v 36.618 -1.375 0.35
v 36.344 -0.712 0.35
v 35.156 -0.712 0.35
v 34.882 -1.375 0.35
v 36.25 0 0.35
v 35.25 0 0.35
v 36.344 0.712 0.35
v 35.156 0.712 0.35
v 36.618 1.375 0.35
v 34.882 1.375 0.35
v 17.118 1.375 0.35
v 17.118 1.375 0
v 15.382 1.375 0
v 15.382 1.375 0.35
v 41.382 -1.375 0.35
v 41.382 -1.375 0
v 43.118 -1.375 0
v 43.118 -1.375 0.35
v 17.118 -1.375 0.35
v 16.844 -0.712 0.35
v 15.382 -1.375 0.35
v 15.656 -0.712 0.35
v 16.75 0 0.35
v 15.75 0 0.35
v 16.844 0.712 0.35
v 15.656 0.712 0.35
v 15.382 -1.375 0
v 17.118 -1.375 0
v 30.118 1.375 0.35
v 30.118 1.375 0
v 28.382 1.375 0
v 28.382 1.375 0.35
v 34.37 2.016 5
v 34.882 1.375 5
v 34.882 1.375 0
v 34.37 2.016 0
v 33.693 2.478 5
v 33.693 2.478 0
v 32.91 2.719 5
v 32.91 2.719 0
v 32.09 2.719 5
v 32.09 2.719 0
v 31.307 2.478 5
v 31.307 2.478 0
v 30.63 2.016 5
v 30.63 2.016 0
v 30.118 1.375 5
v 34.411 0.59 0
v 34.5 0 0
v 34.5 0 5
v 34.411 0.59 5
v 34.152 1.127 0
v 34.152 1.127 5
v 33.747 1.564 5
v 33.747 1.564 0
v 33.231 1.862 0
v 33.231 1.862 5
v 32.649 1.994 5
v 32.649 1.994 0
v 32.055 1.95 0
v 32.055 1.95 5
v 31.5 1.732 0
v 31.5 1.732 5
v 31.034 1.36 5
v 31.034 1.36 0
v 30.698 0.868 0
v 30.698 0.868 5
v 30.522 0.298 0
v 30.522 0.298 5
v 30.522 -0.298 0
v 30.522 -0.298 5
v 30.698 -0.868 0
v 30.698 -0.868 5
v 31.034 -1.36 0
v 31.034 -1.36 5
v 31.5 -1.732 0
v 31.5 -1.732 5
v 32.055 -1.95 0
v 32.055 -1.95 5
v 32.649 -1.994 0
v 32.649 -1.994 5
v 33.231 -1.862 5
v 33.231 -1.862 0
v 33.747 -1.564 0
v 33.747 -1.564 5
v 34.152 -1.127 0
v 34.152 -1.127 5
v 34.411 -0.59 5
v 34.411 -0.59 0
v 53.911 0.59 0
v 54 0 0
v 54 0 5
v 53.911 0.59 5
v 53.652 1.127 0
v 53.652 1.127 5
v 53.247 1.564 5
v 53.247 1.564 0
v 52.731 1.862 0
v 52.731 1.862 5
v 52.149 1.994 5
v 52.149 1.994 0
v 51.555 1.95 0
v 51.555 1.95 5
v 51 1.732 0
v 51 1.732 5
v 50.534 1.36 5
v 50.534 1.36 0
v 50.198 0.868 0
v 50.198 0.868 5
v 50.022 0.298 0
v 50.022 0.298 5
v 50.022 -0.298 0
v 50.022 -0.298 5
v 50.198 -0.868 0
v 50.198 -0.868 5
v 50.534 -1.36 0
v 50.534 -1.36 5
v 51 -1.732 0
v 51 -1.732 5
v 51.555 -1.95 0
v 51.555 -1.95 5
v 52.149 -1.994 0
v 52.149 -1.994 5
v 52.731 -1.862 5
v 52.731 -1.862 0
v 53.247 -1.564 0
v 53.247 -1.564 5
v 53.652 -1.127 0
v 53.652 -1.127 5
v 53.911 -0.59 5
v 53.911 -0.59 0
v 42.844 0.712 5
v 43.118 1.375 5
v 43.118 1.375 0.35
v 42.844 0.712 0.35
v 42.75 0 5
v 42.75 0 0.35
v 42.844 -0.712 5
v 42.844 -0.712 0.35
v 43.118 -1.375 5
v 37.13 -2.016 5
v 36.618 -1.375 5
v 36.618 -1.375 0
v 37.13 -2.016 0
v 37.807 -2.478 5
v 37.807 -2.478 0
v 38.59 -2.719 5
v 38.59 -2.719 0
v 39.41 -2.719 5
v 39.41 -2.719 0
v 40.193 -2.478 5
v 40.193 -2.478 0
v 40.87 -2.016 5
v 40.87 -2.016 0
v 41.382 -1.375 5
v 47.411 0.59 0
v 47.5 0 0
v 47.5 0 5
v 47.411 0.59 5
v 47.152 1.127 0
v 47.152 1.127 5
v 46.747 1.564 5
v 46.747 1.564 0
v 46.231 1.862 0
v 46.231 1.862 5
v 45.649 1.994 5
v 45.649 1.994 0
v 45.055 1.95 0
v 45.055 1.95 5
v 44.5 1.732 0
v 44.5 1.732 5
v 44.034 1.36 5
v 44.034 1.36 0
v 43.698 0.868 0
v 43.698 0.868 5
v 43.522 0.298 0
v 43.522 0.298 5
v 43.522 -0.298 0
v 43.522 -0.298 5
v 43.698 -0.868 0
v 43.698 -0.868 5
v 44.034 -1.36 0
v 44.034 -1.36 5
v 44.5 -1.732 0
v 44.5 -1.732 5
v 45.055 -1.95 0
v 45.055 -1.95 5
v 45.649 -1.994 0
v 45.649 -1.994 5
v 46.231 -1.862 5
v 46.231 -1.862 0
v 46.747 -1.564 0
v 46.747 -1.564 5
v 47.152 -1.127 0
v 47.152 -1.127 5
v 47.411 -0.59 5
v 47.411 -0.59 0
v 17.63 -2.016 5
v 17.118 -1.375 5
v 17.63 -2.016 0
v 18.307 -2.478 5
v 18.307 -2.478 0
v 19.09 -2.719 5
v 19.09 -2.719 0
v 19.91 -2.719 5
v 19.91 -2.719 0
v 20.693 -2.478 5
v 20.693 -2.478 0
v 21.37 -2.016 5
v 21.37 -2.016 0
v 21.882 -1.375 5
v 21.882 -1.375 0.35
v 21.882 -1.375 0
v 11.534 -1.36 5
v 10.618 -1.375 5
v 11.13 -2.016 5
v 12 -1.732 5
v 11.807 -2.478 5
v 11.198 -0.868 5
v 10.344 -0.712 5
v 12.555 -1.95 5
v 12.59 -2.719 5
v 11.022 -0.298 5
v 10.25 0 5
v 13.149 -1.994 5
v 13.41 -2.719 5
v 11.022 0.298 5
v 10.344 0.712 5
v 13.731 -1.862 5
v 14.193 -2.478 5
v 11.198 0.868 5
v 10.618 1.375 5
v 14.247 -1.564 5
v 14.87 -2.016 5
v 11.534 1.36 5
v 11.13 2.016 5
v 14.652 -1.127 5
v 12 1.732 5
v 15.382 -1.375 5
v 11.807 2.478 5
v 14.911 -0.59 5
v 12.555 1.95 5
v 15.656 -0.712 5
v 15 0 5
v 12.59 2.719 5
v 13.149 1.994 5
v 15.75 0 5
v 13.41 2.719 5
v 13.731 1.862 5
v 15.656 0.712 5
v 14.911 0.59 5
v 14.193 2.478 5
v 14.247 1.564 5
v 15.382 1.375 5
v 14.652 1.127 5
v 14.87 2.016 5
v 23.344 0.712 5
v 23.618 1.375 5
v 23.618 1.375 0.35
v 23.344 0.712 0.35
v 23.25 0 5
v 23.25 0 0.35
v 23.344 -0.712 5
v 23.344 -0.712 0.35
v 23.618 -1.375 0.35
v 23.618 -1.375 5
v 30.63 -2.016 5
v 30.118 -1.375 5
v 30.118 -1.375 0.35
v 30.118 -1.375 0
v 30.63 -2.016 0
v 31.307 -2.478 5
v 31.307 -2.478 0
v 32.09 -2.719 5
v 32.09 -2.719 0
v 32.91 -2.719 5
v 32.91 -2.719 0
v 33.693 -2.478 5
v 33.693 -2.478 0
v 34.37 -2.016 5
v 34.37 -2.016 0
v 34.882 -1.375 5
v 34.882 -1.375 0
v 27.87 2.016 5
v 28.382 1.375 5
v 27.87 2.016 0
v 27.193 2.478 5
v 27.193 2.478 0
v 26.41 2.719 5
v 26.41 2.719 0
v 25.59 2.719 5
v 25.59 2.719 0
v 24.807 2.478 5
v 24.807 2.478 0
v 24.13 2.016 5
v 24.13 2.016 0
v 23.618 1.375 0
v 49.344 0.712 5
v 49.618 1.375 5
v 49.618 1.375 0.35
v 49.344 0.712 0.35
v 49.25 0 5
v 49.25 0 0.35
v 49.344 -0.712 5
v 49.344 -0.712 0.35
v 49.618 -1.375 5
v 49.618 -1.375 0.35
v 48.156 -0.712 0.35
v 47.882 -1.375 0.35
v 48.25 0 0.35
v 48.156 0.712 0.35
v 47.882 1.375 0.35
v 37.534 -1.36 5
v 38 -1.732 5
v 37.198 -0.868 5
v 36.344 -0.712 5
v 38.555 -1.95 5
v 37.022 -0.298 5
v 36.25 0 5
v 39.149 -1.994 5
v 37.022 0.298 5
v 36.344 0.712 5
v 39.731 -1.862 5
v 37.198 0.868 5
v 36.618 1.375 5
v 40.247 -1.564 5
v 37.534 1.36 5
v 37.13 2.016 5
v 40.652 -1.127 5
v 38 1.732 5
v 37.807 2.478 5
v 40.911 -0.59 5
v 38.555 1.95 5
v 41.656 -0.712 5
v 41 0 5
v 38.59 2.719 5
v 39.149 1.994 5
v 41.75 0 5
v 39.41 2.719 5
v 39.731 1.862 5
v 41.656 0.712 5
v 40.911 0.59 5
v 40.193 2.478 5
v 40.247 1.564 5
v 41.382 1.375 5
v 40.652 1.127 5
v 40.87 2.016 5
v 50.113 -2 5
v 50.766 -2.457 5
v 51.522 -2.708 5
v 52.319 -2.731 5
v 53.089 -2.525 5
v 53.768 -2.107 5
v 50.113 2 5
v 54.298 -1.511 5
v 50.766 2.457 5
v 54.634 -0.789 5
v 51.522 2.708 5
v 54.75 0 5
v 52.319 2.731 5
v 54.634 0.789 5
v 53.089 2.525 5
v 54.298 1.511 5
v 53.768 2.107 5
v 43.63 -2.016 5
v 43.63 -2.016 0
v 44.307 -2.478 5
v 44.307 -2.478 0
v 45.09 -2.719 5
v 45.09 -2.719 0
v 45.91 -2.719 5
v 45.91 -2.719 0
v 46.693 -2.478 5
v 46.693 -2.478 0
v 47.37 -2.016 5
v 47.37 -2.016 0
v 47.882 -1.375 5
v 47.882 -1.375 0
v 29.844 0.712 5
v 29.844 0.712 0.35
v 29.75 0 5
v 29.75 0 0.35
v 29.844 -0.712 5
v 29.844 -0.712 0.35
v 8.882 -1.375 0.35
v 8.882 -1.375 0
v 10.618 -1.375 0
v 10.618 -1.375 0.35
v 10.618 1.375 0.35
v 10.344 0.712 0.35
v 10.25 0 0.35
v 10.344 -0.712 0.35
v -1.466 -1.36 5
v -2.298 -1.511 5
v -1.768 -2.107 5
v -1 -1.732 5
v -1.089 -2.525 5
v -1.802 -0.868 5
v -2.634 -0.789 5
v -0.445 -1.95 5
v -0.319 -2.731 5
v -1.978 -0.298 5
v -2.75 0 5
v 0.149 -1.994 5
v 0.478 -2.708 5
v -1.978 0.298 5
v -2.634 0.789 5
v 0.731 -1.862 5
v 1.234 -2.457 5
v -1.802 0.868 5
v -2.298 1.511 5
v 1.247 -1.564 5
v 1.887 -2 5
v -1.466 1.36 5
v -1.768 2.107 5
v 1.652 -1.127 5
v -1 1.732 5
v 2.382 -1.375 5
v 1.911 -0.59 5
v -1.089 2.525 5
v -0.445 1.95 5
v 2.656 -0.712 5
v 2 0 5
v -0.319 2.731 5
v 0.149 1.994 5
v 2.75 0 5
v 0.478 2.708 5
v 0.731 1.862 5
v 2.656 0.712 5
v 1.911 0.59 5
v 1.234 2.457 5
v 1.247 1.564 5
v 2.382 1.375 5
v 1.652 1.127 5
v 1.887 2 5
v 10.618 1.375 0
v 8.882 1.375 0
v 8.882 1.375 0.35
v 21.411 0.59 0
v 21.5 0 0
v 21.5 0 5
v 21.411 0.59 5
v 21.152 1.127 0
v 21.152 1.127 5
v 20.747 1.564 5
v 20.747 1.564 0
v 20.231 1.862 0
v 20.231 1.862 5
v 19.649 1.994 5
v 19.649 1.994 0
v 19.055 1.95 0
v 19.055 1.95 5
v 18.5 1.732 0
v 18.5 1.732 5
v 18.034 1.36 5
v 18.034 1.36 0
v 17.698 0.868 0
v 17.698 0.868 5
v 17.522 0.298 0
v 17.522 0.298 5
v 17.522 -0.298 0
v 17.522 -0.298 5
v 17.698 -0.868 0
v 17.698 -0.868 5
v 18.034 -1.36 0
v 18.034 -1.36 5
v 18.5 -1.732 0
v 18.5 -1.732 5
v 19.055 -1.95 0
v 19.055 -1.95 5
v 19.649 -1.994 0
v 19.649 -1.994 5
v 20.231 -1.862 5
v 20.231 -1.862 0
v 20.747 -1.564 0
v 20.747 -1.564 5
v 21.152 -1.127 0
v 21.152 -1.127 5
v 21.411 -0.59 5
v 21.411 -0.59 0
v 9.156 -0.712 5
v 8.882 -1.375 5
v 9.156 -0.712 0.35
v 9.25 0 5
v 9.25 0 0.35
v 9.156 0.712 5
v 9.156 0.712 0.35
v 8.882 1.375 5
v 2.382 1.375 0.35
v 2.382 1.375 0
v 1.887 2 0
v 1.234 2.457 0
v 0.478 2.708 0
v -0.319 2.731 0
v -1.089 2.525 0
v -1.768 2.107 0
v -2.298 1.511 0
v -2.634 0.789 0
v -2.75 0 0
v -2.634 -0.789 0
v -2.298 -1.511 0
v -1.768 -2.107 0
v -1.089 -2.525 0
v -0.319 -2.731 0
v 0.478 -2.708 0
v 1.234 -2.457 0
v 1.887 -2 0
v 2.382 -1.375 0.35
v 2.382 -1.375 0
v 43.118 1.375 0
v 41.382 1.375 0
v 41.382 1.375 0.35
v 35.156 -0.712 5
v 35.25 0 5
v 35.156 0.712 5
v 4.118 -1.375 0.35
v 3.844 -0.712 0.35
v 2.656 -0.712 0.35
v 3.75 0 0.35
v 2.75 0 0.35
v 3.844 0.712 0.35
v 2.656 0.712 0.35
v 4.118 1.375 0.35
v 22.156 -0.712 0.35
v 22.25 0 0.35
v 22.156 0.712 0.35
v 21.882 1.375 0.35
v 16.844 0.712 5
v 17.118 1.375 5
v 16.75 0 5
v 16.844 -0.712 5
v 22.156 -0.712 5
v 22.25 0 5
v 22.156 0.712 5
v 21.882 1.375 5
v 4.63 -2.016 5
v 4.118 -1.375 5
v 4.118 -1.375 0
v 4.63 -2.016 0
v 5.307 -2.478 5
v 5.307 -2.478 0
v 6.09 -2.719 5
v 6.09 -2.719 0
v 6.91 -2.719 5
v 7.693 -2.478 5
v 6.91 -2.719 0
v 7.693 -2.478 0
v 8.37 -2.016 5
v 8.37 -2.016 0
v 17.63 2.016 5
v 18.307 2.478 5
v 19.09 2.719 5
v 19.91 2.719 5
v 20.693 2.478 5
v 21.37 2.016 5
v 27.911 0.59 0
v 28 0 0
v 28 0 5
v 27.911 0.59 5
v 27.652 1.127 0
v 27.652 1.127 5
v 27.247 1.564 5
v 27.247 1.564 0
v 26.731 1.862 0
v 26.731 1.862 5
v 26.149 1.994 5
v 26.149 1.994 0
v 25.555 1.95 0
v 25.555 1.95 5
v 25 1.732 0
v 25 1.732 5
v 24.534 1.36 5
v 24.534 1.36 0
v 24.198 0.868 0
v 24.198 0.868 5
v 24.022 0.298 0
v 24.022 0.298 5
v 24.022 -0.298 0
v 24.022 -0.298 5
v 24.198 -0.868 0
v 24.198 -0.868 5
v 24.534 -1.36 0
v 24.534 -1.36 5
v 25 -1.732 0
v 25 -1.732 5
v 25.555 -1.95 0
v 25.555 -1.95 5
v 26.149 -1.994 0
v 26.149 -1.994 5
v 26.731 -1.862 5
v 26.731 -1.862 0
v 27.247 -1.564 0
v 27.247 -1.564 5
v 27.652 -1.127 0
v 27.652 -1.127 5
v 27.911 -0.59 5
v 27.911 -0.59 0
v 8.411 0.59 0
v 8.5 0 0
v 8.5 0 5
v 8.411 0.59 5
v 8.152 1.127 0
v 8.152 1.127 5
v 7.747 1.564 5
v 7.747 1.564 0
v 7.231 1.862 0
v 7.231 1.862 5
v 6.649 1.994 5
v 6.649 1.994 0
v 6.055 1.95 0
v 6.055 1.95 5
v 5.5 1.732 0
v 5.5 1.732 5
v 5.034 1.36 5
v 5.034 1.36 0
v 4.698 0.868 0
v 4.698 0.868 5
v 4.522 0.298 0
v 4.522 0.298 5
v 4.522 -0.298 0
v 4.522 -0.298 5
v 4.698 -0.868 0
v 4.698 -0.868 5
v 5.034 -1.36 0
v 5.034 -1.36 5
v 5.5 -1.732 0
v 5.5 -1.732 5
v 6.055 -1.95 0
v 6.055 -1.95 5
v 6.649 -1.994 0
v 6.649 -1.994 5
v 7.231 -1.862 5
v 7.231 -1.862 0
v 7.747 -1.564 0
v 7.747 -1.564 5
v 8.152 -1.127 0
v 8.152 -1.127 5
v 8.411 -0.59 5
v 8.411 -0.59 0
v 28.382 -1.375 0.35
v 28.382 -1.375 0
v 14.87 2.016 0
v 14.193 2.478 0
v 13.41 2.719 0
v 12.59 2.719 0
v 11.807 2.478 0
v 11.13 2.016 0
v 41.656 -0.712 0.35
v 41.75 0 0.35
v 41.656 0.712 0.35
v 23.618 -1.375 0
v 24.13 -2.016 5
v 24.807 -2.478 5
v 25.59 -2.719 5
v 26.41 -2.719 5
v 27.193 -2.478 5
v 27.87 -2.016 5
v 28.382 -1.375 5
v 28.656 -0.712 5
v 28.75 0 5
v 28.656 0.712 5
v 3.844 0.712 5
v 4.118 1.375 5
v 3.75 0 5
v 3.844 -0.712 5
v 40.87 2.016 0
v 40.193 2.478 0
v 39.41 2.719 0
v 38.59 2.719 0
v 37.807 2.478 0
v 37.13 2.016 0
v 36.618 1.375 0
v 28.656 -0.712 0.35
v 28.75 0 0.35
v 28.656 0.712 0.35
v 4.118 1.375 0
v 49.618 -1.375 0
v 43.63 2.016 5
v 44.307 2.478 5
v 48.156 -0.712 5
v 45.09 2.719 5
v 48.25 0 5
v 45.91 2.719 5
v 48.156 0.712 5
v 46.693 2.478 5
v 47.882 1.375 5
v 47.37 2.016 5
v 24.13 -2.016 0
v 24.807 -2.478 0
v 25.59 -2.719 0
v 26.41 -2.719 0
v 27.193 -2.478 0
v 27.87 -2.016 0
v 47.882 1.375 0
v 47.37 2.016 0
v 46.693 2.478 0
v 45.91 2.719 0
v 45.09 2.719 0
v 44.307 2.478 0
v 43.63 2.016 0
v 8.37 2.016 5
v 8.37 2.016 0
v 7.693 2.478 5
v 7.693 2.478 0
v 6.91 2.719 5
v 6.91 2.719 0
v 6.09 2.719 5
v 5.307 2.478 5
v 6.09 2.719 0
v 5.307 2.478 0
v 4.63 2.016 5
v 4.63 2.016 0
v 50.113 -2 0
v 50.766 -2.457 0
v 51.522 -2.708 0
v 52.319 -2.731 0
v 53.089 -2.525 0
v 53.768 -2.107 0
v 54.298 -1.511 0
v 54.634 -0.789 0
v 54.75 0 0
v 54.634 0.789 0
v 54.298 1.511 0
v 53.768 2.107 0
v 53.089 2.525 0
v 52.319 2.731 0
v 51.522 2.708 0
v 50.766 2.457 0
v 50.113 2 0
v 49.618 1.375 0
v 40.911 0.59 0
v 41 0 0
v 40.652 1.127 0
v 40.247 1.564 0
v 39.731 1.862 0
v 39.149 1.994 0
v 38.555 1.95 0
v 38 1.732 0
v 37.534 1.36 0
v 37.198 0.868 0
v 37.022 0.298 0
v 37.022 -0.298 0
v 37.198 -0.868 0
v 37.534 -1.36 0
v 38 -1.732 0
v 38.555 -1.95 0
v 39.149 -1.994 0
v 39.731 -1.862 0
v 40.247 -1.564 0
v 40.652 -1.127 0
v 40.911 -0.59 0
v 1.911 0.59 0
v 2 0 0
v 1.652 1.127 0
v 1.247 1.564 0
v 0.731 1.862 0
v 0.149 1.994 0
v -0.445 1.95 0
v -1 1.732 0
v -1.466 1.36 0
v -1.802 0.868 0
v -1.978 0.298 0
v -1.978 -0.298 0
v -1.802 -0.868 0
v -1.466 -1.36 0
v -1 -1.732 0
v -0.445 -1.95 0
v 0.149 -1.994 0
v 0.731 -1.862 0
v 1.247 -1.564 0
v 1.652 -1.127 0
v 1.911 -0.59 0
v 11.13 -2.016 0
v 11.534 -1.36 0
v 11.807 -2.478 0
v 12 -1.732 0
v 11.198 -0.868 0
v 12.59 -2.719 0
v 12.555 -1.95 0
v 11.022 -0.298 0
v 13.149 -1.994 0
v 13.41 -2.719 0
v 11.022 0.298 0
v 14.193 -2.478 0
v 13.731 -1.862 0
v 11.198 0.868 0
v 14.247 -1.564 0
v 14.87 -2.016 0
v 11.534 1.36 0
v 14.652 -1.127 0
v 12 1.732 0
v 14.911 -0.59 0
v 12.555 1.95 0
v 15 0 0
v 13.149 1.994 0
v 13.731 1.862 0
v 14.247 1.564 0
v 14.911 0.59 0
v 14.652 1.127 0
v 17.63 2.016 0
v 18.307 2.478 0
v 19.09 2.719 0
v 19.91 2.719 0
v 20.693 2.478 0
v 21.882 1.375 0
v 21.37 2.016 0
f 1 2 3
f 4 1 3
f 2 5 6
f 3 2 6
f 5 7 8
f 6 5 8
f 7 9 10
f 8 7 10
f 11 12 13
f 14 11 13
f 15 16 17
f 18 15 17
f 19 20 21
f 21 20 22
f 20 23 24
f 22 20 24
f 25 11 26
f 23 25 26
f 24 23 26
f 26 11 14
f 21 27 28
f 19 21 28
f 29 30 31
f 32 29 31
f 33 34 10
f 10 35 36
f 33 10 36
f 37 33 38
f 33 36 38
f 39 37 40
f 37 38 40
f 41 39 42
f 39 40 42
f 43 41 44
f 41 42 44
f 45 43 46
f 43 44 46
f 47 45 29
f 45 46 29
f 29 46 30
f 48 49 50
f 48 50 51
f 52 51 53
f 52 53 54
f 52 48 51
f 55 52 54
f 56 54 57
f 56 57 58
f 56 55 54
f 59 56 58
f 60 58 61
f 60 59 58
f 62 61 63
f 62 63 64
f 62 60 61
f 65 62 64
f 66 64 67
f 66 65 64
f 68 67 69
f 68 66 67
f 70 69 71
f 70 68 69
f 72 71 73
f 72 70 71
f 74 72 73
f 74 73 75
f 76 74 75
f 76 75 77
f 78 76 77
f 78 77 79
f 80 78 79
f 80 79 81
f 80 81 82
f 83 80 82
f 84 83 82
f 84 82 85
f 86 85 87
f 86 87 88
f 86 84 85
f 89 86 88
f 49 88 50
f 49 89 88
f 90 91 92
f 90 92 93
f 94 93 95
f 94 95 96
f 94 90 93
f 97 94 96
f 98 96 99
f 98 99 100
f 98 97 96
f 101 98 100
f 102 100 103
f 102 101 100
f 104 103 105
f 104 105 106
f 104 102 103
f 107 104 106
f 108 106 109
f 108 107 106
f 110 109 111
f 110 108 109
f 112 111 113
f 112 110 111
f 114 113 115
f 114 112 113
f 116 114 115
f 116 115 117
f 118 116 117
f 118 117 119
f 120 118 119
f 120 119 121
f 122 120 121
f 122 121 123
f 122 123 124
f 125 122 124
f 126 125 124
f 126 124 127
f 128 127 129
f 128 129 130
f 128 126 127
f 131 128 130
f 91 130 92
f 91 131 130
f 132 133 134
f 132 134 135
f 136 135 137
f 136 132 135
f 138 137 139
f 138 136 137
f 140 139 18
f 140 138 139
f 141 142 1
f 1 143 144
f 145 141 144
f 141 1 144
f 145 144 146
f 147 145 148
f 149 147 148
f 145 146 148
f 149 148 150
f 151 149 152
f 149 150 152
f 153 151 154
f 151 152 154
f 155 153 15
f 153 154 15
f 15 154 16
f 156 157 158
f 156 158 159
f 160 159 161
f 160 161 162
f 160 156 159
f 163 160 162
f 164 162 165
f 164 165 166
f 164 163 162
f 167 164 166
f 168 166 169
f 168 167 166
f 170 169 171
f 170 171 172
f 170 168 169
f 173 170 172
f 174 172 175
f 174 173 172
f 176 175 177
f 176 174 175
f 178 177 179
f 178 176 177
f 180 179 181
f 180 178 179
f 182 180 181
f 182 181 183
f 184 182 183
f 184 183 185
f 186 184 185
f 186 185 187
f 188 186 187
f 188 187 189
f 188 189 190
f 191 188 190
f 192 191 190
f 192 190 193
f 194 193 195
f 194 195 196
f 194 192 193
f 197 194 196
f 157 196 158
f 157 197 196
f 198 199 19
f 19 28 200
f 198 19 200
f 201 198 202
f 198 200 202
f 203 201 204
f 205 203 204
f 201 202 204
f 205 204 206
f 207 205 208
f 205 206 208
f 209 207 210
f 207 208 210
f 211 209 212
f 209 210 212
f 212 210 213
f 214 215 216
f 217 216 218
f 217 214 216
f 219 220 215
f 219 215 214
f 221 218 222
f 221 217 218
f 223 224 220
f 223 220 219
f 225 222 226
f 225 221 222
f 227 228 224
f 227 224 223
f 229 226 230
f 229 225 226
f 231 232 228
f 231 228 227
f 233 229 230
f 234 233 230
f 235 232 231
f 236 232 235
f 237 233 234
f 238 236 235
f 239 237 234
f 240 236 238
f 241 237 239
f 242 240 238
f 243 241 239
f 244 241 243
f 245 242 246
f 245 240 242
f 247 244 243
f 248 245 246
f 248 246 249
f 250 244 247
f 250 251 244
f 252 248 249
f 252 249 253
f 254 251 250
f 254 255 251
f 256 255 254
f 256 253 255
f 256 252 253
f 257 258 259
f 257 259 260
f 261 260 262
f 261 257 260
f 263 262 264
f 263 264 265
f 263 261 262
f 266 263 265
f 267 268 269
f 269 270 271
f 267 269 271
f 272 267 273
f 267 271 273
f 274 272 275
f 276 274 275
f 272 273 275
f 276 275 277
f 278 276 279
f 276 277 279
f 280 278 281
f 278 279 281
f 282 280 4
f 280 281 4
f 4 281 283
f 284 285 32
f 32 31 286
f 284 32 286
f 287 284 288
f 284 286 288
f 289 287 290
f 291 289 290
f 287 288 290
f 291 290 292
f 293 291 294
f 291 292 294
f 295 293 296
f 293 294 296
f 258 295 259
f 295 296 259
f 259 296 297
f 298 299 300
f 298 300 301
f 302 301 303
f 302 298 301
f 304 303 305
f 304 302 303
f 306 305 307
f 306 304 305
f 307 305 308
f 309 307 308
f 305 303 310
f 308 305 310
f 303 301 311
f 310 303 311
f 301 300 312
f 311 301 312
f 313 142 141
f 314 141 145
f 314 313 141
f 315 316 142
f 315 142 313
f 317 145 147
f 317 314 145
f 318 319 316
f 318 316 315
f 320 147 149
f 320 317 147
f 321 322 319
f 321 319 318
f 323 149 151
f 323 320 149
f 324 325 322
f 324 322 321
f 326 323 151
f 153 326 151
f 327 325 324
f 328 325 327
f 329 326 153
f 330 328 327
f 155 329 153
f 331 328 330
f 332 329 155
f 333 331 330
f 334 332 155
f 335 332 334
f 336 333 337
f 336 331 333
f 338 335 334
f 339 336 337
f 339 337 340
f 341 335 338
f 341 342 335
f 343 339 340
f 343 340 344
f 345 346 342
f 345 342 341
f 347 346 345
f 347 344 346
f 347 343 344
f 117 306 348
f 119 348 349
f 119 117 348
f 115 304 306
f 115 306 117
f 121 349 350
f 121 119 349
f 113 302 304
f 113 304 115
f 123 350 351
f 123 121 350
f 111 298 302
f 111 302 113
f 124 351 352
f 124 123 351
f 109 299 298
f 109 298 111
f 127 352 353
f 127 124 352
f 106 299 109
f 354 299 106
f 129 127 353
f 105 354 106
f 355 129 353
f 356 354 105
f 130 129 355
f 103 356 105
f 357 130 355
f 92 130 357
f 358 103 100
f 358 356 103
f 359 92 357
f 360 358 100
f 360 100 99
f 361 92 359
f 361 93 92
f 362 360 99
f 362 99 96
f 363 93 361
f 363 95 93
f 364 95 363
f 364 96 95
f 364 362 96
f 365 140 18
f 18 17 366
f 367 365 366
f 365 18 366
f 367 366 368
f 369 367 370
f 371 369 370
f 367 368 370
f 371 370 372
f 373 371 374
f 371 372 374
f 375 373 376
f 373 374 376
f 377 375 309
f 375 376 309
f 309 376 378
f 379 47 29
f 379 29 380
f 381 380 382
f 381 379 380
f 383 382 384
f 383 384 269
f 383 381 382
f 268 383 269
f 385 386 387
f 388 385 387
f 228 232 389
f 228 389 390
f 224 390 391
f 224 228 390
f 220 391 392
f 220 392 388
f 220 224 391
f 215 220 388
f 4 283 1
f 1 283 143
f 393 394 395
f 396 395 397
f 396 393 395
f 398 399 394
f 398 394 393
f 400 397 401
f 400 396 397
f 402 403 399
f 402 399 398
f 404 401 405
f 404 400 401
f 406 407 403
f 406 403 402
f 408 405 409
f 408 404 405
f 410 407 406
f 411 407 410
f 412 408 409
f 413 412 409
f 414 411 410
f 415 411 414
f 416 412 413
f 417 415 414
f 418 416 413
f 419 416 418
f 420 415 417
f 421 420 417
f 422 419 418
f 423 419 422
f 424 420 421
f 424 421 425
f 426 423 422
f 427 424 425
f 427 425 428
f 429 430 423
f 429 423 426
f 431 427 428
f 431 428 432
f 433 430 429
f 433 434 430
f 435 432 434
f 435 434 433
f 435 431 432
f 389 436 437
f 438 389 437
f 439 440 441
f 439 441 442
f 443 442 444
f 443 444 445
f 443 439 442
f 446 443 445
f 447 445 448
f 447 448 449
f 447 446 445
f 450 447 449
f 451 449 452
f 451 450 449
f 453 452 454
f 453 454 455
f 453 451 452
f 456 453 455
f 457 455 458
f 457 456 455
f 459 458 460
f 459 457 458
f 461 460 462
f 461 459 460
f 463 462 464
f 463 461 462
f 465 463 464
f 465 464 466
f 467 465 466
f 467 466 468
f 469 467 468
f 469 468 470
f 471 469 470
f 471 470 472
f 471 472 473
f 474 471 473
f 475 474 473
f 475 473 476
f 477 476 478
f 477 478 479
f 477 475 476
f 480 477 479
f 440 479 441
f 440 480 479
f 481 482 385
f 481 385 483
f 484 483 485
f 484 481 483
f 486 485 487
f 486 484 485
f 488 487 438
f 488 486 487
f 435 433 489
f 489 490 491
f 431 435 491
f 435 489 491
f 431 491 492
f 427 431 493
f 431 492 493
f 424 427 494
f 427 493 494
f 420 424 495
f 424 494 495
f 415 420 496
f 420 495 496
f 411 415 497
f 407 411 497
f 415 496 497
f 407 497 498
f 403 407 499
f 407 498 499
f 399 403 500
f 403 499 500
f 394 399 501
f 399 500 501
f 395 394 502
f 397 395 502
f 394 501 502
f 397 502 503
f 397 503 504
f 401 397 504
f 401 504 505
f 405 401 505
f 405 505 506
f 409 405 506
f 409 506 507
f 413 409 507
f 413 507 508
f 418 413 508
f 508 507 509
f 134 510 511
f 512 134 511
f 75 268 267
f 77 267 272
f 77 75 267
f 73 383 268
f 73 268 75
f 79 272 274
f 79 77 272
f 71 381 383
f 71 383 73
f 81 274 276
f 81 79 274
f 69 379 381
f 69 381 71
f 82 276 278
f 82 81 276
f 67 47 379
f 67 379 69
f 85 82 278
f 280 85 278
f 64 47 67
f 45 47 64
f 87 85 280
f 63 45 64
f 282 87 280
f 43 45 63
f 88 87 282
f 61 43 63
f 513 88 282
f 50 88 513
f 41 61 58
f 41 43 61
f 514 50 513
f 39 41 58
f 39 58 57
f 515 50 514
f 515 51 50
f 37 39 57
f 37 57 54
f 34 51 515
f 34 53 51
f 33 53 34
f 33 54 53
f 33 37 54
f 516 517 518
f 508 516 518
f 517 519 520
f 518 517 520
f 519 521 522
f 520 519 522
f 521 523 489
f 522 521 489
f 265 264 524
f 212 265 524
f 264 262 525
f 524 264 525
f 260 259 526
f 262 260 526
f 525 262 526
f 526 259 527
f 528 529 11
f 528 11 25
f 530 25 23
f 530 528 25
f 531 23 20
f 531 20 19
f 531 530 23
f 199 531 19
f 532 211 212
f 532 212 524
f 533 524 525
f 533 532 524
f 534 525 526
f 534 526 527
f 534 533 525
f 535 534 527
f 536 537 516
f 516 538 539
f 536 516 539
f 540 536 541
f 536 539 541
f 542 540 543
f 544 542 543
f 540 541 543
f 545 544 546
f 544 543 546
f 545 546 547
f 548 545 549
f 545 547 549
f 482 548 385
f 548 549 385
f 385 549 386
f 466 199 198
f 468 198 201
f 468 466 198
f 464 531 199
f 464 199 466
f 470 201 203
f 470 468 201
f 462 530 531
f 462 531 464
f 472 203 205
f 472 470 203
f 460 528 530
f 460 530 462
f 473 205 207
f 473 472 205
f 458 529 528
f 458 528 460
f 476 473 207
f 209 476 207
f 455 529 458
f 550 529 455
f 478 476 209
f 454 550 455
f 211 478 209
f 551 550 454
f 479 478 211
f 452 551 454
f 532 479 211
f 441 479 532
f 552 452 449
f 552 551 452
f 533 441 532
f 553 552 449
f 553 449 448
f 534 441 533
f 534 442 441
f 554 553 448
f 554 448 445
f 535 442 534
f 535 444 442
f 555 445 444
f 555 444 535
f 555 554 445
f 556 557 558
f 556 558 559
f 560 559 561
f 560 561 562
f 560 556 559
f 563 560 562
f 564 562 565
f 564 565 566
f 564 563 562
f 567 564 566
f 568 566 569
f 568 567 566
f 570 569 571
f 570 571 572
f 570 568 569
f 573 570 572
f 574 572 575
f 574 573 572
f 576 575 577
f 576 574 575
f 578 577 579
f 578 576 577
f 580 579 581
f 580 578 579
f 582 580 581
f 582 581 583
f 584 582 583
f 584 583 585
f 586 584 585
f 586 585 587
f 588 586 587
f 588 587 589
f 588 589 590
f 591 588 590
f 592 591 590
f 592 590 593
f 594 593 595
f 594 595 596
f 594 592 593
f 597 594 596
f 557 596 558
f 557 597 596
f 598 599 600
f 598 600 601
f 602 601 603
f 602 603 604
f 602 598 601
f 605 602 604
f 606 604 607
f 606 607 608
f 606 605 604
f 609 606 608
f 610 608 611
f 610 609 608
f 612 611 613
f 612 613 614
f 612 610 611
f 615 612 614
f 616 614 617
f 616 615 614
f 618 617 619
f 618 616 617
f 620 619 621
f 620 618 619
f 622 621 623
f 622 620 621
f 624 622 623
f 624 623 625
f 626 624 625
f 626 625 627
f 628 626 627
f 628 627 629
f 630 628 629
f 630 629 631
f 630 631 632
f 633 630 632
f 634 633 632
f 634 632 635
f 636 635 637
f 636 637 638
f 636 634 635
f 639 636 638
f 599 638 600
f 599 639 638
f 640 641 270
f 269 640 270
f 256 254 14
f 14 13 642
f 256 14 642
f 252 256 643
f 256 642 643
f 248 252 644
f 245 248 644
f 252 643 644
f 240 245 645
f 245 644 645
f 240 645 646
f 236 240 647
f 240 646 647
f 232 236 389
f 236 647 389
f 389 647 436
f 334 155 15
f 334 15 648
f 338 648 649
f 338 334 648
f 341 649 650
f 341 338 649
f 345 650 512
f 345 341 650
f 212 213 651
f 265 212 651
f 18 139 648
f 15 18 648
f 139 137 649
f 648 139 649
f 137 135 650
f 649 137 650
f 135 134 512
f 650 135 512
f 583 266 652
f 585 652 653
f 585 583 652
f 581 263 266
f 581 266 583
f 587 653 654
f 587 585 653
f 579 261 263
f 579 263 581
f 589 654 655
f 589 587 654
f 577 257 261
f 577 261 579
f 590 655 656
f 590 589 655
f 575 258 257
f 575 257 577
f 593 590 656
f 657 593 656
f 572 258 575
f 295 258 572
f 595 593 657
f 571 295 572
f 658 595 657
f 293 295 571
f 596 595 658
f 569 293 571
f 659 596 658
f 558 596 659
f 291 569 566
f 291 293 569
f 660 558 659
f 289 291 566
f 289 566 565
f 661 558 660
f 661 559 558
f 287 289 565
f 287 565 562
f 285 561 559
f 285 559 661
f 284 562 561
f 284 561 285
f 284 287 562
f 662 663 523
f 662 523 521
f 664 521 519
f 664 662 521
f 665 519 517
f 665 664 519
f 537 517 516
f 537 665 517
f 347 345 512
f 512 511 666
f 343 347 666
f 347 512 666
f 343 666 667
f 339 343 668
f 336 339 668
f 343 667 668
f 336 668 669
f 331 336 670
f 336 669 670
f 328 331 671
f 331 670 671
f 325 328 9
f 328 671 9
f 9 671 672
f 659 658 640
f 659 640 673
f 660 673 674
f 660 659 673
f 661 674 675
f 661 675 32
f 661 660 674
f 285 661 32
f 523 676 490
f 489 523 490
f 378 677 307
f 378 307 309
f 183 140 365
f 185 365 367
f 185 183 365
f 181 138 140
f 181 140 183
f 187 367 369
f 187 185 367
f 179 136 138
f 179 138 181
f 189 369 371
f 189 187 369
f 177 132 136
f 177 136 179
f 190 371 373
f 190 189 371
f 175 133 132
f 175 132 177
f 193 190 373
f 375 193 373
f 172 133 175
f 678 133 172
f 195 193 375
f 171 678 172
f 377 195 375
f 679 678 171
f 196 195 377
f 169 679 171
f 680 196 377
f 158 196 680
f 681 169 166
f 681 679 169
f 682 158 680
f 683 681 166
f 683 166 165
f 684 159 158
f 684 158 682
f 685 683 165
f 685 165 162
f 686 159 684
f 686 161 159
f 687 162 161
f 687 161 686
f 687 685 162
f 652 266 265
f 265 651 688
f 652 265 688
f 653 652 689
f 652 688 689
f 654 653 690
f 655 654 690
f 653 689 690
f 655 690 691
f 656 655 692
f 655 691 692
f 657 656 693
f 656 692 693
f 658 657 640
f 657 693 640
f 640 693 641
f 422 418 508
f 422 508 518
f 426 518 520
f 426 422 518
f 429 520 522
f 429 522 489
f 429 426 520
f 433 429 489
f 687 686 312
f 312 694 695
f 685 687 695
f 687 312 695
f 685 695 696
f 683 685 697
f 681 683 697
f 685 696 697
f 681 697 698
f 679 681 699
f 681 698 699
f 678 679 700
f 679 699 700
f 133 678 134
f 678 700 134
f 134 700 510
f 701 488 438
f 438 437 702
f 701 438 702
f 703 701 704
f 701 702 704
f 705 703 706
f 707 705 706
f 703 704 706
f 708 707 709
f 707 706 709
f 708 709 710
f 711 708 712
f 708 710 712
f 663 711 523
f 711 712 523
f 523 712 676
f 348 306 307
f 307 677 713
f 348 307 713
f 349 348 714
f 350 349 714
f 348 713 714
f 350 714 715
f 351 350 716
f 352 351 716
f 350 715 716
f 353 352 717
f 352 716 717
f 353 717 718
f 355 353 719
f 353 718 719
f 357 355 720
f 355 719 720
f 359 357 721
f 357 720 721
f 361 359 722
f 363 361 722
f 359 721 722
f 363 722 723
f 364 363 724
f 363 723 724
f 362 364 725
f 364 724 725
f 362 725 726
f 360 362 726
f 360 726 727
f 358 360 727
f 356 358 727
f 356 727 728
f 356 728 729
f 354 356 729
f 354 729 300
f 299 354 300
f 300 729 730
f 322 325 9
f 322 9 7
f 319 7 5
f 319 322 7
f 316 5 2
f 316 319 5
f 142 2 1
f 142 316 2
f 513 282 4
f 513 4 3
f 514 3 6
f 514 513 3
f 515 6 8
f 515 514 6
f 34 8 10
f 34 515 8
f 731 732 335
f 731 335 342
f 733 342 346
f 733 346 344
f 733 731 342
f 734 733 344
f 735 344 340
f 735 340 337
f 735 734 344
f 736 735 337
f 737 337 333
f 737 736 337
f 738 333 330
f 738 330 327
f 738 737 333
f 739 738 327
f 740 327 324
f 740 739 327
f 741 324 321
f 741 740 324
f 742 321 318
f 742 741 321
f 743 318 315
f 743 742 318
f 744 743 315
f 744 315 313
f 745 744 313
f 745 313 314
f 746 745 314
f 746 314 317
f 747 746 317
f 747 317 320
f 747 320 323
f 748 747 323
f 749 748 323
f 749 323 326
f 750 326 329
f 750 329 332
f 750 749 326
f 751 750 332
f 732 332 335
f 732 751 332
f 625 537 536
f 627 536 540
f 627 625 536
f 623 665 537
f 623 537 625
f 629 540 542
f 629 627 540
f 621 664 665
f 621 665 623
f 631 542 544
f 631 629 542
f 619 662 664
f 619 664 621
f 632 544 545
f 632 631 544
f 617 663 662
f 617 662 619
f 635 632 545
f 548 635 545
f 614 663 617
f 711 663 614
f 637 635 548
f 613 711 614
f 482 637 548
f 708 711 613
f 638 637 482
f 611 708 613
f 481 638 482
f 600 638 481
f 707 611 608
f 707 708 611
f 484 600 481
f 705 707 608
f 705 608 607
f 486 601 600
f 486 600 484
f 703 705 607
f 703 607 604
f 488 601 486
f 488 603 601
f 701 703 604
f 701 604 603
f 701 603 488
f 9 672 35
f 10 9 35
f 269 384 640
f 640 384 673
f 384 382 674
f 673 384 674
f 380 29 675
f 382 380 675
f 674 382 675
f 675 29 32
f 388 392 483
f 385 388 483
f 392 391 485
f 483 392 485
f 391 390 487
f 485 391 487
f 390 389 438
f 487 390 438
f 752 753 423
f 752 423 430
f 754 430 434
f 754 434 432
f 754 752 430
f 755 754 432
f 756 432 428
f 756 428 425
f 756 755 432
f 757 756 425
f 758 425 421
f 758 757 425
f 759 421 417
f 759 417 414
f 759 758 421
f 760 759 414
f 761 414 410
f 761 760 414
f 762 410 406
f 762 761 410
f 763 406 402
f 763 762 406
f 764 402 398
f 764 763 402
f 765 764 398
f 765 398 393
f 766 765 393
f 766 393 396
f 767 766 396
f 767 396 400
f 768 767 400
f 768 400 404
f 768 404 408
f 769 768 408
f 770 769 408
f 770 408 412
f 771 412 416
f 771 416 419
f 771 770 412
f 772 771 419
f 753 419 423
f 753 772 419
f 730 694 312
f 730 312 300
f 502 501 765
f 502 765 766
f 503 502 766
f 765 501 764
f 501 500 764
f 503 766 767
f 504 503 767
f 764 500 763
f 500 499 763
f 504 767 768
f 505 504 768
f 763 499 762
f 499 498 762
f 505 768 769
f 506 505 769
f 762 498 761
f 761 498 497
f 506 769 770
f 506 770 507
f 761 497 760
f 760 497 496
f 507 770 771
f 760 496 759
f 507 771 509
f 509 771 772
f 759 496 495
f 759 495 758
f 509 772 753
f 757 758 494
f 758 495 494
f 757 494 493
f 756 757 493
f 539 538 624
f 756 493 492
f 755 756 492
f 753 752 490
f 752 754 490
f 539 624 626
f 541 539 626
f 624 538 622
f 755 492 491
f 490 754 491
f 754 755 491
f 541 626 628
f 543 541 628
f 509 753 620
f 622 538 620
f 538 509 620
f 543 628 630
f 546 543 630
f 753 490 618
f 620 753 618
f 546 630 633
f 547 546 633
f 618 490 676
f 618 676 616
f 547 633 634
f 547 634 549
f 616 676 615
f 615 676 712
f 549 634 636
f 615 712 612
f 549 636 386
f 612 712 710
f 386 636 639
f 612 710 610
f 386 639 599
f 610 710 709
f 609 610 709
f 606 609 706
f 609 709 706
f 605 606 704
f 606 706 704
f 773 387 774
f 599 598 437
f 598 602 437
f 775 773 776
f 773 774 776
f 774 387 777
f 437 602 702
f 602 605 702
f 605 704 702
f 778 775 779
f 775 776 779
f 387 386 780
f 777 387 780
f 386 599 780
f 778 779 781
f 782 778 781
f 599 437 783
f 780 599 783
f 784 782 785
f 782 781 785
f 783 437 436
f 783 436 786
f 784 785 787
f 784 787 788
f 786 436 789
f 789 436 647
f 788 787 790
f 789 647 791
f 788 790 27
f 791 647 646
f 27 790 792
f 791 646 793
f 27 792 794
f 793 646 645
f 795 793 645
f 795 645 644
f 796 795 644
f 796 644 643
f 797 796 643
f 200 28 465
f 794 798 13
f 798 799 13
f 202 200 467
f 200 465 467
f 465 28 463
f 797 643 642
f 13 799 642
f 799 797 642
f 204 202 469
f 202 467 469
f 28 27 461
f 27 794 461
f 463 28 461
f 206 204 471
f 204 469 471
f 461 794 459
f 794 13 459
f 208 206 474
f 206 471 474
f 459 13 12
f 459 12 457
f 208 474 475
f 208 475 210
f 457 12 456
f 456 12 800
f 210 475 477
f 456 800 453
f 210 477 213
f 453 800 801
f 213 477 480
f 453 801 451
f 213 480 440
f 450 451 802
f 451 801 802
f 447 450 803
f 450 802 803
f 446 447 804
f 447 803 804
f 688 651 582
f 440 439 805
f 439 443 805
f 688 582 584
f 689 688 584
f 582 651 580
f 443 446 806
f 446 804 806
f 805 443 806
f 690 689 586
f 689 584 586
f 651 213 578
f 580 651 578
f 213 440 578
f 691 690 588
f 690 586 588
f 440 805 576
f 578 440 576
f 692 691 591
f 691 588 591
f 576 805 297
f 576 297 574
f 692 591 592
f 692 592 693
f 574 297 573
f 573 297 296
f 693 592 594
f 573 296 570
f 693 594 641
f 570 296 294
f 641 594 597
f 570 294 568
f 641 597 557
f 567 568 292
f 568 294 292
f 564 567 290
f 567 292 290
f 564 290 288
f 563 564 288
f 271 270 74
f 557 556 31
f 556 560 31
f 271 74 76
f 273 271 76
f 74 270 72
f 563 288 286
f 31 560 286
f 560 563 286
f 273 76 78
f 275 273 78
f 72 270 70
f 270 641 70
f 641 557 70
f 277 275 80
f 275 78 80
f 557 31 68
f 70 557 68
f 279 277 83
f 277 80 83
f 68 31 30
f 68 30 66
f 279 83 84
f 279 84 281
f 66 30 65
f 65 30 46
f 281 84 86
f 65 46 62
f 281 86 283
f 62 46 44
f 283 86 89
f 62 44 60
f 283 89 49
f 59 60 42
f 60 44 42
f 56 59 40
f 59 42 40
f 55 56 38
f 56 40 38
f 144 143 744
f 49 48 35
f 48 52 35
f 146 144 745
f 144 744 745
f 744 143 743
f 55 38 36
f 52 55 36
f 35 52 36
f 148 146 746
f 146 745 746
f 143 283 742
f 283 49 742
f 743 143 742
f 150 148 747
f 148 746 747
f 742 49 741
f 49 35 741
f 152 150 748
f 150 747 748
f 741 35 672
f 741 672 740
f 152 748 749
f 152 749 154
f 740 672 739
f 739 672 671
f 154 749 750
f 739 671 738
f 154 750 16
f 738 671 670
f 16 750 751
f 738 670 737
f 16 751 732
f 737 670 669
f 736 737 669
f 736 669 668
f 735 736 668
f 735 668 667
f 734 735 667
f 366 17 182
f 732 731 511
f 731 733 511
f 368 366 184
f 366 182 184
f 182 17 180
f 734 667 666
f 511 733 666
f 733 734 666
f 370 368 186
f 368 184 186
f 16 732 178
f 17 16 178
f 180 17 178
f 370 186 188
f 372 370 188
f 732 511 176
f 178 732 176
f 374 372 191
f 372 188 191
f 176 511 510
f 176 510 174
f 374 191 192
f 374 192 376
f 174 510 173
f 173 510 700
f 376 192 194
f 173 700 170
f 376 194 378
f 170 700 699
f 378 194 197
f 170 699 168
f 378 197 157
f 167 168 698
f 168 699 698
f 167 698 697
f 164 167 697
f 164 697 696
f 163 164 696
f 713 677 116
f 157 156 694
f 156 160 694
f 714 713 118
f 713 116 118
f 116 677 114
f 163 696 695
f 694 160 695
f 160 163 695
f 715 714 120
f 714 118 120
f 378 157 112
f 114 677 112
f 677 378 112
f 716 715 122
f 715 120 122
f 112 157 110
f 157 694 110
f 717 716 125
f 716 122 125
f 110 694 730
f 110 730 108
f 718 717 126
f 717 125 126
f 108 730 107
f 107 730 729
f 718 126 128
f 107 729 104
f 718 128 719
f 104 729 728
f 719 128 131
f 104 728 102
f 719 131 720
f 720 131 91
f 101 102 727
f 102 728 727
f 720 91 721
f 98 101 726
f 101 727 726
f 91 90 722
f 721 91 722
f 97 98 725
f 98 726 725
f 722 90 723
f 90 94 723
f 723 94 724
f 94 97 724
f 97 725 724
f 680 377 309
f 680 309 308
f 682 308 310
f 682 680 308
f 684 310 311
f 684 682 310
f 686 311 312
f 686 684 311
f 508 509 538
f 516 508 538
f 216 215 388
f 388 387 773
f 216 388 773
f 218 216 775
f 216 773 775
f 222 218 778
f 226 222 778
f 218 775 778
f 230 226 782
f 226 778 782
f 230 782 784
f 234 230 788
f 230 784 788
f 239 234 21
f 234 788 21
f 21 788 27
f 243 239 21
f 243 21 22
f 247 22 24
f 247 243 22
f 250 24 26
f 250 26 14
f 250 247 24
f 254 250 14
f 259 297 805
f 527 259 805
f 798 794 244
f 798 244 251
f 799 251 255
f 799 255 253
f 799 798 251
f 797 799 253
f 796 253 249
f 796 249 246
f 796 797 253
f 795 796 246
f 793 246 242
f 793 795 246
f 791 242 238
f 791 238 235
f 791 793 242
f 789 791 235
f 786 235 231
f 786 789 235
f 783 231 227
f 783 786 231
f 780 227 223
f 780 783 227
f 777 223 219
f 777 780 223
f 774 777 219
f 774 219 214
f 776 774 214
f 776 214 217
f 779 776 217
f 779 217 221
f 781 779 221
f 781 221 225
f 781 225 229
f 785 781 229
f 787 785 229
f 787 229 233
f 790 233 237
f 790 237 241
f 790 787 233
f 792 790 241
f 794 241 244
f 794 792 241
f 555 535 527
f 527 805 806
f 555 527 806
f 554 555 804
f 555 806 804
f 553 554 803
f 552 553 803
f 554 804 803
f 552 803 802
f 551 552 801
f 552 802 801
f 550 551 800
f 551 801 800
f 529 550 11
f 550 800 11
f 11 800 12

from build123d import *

# Parameters (mm, degrees)
SKETCH_R     = 2
PAD_DEPTH    = 5
POCKET_DEPTH = 4.65


with BuildPart() as part:
    # Sketch → Pad (new body)
    with BuildSketch(Plane.XY):
        with BuildLine():
            ThreePointArc((49.61843, -1.375), (54.75, 0), (49.61843, 1.375))
            Line((47.88157, 1.375), (49.61843, 1.375))
            ThreePointArc((47.88157, 1.375), (45.5, 2.75), (43.11843, 1.375))
            Line((43.11843, 1.375), (41.38157, 1.375))
            ThreePointArc((41.38157, 1.375), (39, 2.75), (36.61843, 1.375))
            Line((36.61843, 1.375), (34.88157, 1.375))
            ThreePointArc((34.88157, 1.375), (32.5, 2.75), (30.11843, 1.375))
            Line((30.11843, 1.375), (28.38157, 1.375))
            ThreePointArc((28.38157, 1.375), (26, 2.75), (23.61843, 1.375))
            Line((23.61843, 1.375), (21.88157, 1.375))
            ThreePointArc((21.88157, 1.375), (19.5, 2.75), (17.11843, 1.375))
            Line((17.11843, 1.375), (15.38157, 1.375))
            ThreePointArc((15.38157, 1.375), (13, 2.75), (10.61843, 1.375))
            Line((10.61843, 1.375), (8.88157, 1.375))
            ThreePointArc((8.88157, 1.375), (6.5, 2.75), (4.11843, 1.375))
            Line((4.11843, 1.375), (2.38157, 1.375))
            ThreePointArc((2.38157, 1.375), (-2.75, 0), (2.38157, -1.375))
            Line((2.38157, -1.375), (4.11843, -1.375))
            ThreePointArc((4.11843, -1.375), (6.5, -2.75), (8.88157, -1.375))
            Line((8.88157, -1.375), (10.61843, -1.375))
            ThreePointArc((10.61843, -1.375), (13, -2.75), (15.38157, -1.375))
            Line((15.38157, -1.375), (17.11843, -1.375))
            ThreePointArc((17.11843, -1.375), (19.5, -2.75), (21.88157, -1.375))
            Line((21.88157, -1.375), (23.61843, -1.375))
            ThreePointArc((23.61843, -1.375), (26, -2.75), (28.38157, -1.375))
            Line((28.38157, -1.375), (30.11843, -1.375))
            ThreePointArc((30.11843, -1.375), (32.5, -2.75), (34.88157, -1.375))
            Line((34.88157, -1.375), (36.61843, -1.375))
            ThreePointArc((36.61843, -1.375), (39, -2.75), (41.38157, -1.375))
            Line((41.38157, -1.375), (43.11843, -1.375))
            ThreePointArc((43.11843, -1.375), (45.5, -2.75), (47.88157, -1.375))
            Line((49.61843, -1.375), (47.88157, -1.375))
        make_face()
        Circle(SKETCH_R, mode=Mode.SUBTRACT)
        with Locations((6.5, 0)):
            Circle(SKETCH_R, mode=Mode.SUBTRACT)
        with Locations((13, 0)):
            Circle(SKETCH_R, mode=Mode.SUBTRACT)
        with Locations((19.5, 0)):
            Circle(SKETCH_R, mode=Mode.SUBTRACT)
        with Locations((26, 0)):
            Circle(SKETCH_R, mode=Mode.SUBTRACT)
        with Locations((32.5, 0)):
            Circle(SKETCH_R, mode=Mode.SUBTRACT)
        with Locations((39, 0)):
            Circle(SKETCH_R, mode=Mode.SUBTRACT)
        with Locations((45.5, 0)):
            Circle(SKETCH_R, mode=Mode.SUBTRACT)
        with Locations((52, 0)):
            Circle(SKETCH_R, mode=Mode.SUBTRACT)
    extrude(amount=PAD_DEPTH)

    # Sketch001 (on Face43 of Pad) → Pocket (cut)
    with BuildSketch(Plane.XY.offset(5)):
        with BuildLine():
            ThreePointArc((2.38157, -1.375), (2.75, 0), (2.38157, 1.375))
            Line((2.38157, 1.375), (4.11843, 1.375))
            ThreePointArc((4.11843, 1.375), (3.75, 0), (4.11843, -1.375))
            Line((4.11843, -1.375), (2.38157, -1.375))
        make_face()
        with BuildLine():
            ThreePointArc((8.88157, -1.375), (9.25, 0), (8.88157, 1.375))
            Line((8.88157, 1.375), (10.61843, 1.375))
            ThreePointArc((10.61843, 1.375), (10.25, 0), (10.61843, -1.375))
            Line((10.61843, -1.375), (8.88157, -1.375))
        make_face()
        with BuildLine():
            ThreePointArc((15.38157, -1.375), (15.75, 0), (15.38157, 1.375))
            Line((15.38157, 1.375), (17.11843, 1.375))
            ThreePointArc((17.11843, 1.375), (16.75, 0), (17.11843, -1.375))
            Line((17.11843, -1.375), (15.38157, -1.375))
        make_face()
        with BuildLine():
            ThreePointArc((23.61843, 1.375), (23.25, 0), (23.61843, -1.375))
            Line((23.61843, -1.375), (21.88157, -1.375))
            ThreePointArc((21.88157, -1.375), (22.25, 0), (21.88157, 1.375))
            Line((21.88157, 1.375), (23.61843, 1.375))
        make_face()
        with BuildLine():
            ThreePointArc((28.38157, -1.375), (28.75, 0), (28.38157, 1.375))
            Line((28.38157, 1.375), (30.11843, 1.375))
            ThreePointArc((30.11843, 1.375), (29.75, 0), (30.11843, -1.375))
            Line((30.11843, -1.375), (28.38157, -1.375))
        make_face()
        with BuildLine():
            ThreePointArc((34.88157, -1.375), (35.25, 0), (34.88157, 1.375))
            Line((34.88157, 1.375), (36.61843, 1.375))
            ThreePointArc((36.61843, 1.375), (36.25, 0), (36.61843, -1.375))
            Line((36.61843, -1.375), (34.88157, -1.375))
        make_face()
        with BuildLine():
            ThreePointArc((41.38157, -1.375), (41.75, 0), (41.38157, 1.375))
            Line((41.38157, 1.375), (43.11843, 1.375))
            ThreePointArc((43.11843, 1.375), (42.75, 0), (43.11843, -1.375))
            Line((43.11843, -1.375), (41.38157, -1.375))
        make_face()
        with BuildLine():
            ThreePointArc((47.88157, -1.375), (48.25, 0), (47.88157, 1.375))
            Line((47.88157, 1.375), (49.61843, 1.375))
            ThreePointArc((49.61843, 1.375), (49.25, 0), (49.61843, -1.375))
            Line((49.61843, -1.375), (47.88157, -1.375))
        make_face()
    extrude(amount=-POCKET_DEPTH, mode=Mode.SUBTRACT)


solid = part.part
